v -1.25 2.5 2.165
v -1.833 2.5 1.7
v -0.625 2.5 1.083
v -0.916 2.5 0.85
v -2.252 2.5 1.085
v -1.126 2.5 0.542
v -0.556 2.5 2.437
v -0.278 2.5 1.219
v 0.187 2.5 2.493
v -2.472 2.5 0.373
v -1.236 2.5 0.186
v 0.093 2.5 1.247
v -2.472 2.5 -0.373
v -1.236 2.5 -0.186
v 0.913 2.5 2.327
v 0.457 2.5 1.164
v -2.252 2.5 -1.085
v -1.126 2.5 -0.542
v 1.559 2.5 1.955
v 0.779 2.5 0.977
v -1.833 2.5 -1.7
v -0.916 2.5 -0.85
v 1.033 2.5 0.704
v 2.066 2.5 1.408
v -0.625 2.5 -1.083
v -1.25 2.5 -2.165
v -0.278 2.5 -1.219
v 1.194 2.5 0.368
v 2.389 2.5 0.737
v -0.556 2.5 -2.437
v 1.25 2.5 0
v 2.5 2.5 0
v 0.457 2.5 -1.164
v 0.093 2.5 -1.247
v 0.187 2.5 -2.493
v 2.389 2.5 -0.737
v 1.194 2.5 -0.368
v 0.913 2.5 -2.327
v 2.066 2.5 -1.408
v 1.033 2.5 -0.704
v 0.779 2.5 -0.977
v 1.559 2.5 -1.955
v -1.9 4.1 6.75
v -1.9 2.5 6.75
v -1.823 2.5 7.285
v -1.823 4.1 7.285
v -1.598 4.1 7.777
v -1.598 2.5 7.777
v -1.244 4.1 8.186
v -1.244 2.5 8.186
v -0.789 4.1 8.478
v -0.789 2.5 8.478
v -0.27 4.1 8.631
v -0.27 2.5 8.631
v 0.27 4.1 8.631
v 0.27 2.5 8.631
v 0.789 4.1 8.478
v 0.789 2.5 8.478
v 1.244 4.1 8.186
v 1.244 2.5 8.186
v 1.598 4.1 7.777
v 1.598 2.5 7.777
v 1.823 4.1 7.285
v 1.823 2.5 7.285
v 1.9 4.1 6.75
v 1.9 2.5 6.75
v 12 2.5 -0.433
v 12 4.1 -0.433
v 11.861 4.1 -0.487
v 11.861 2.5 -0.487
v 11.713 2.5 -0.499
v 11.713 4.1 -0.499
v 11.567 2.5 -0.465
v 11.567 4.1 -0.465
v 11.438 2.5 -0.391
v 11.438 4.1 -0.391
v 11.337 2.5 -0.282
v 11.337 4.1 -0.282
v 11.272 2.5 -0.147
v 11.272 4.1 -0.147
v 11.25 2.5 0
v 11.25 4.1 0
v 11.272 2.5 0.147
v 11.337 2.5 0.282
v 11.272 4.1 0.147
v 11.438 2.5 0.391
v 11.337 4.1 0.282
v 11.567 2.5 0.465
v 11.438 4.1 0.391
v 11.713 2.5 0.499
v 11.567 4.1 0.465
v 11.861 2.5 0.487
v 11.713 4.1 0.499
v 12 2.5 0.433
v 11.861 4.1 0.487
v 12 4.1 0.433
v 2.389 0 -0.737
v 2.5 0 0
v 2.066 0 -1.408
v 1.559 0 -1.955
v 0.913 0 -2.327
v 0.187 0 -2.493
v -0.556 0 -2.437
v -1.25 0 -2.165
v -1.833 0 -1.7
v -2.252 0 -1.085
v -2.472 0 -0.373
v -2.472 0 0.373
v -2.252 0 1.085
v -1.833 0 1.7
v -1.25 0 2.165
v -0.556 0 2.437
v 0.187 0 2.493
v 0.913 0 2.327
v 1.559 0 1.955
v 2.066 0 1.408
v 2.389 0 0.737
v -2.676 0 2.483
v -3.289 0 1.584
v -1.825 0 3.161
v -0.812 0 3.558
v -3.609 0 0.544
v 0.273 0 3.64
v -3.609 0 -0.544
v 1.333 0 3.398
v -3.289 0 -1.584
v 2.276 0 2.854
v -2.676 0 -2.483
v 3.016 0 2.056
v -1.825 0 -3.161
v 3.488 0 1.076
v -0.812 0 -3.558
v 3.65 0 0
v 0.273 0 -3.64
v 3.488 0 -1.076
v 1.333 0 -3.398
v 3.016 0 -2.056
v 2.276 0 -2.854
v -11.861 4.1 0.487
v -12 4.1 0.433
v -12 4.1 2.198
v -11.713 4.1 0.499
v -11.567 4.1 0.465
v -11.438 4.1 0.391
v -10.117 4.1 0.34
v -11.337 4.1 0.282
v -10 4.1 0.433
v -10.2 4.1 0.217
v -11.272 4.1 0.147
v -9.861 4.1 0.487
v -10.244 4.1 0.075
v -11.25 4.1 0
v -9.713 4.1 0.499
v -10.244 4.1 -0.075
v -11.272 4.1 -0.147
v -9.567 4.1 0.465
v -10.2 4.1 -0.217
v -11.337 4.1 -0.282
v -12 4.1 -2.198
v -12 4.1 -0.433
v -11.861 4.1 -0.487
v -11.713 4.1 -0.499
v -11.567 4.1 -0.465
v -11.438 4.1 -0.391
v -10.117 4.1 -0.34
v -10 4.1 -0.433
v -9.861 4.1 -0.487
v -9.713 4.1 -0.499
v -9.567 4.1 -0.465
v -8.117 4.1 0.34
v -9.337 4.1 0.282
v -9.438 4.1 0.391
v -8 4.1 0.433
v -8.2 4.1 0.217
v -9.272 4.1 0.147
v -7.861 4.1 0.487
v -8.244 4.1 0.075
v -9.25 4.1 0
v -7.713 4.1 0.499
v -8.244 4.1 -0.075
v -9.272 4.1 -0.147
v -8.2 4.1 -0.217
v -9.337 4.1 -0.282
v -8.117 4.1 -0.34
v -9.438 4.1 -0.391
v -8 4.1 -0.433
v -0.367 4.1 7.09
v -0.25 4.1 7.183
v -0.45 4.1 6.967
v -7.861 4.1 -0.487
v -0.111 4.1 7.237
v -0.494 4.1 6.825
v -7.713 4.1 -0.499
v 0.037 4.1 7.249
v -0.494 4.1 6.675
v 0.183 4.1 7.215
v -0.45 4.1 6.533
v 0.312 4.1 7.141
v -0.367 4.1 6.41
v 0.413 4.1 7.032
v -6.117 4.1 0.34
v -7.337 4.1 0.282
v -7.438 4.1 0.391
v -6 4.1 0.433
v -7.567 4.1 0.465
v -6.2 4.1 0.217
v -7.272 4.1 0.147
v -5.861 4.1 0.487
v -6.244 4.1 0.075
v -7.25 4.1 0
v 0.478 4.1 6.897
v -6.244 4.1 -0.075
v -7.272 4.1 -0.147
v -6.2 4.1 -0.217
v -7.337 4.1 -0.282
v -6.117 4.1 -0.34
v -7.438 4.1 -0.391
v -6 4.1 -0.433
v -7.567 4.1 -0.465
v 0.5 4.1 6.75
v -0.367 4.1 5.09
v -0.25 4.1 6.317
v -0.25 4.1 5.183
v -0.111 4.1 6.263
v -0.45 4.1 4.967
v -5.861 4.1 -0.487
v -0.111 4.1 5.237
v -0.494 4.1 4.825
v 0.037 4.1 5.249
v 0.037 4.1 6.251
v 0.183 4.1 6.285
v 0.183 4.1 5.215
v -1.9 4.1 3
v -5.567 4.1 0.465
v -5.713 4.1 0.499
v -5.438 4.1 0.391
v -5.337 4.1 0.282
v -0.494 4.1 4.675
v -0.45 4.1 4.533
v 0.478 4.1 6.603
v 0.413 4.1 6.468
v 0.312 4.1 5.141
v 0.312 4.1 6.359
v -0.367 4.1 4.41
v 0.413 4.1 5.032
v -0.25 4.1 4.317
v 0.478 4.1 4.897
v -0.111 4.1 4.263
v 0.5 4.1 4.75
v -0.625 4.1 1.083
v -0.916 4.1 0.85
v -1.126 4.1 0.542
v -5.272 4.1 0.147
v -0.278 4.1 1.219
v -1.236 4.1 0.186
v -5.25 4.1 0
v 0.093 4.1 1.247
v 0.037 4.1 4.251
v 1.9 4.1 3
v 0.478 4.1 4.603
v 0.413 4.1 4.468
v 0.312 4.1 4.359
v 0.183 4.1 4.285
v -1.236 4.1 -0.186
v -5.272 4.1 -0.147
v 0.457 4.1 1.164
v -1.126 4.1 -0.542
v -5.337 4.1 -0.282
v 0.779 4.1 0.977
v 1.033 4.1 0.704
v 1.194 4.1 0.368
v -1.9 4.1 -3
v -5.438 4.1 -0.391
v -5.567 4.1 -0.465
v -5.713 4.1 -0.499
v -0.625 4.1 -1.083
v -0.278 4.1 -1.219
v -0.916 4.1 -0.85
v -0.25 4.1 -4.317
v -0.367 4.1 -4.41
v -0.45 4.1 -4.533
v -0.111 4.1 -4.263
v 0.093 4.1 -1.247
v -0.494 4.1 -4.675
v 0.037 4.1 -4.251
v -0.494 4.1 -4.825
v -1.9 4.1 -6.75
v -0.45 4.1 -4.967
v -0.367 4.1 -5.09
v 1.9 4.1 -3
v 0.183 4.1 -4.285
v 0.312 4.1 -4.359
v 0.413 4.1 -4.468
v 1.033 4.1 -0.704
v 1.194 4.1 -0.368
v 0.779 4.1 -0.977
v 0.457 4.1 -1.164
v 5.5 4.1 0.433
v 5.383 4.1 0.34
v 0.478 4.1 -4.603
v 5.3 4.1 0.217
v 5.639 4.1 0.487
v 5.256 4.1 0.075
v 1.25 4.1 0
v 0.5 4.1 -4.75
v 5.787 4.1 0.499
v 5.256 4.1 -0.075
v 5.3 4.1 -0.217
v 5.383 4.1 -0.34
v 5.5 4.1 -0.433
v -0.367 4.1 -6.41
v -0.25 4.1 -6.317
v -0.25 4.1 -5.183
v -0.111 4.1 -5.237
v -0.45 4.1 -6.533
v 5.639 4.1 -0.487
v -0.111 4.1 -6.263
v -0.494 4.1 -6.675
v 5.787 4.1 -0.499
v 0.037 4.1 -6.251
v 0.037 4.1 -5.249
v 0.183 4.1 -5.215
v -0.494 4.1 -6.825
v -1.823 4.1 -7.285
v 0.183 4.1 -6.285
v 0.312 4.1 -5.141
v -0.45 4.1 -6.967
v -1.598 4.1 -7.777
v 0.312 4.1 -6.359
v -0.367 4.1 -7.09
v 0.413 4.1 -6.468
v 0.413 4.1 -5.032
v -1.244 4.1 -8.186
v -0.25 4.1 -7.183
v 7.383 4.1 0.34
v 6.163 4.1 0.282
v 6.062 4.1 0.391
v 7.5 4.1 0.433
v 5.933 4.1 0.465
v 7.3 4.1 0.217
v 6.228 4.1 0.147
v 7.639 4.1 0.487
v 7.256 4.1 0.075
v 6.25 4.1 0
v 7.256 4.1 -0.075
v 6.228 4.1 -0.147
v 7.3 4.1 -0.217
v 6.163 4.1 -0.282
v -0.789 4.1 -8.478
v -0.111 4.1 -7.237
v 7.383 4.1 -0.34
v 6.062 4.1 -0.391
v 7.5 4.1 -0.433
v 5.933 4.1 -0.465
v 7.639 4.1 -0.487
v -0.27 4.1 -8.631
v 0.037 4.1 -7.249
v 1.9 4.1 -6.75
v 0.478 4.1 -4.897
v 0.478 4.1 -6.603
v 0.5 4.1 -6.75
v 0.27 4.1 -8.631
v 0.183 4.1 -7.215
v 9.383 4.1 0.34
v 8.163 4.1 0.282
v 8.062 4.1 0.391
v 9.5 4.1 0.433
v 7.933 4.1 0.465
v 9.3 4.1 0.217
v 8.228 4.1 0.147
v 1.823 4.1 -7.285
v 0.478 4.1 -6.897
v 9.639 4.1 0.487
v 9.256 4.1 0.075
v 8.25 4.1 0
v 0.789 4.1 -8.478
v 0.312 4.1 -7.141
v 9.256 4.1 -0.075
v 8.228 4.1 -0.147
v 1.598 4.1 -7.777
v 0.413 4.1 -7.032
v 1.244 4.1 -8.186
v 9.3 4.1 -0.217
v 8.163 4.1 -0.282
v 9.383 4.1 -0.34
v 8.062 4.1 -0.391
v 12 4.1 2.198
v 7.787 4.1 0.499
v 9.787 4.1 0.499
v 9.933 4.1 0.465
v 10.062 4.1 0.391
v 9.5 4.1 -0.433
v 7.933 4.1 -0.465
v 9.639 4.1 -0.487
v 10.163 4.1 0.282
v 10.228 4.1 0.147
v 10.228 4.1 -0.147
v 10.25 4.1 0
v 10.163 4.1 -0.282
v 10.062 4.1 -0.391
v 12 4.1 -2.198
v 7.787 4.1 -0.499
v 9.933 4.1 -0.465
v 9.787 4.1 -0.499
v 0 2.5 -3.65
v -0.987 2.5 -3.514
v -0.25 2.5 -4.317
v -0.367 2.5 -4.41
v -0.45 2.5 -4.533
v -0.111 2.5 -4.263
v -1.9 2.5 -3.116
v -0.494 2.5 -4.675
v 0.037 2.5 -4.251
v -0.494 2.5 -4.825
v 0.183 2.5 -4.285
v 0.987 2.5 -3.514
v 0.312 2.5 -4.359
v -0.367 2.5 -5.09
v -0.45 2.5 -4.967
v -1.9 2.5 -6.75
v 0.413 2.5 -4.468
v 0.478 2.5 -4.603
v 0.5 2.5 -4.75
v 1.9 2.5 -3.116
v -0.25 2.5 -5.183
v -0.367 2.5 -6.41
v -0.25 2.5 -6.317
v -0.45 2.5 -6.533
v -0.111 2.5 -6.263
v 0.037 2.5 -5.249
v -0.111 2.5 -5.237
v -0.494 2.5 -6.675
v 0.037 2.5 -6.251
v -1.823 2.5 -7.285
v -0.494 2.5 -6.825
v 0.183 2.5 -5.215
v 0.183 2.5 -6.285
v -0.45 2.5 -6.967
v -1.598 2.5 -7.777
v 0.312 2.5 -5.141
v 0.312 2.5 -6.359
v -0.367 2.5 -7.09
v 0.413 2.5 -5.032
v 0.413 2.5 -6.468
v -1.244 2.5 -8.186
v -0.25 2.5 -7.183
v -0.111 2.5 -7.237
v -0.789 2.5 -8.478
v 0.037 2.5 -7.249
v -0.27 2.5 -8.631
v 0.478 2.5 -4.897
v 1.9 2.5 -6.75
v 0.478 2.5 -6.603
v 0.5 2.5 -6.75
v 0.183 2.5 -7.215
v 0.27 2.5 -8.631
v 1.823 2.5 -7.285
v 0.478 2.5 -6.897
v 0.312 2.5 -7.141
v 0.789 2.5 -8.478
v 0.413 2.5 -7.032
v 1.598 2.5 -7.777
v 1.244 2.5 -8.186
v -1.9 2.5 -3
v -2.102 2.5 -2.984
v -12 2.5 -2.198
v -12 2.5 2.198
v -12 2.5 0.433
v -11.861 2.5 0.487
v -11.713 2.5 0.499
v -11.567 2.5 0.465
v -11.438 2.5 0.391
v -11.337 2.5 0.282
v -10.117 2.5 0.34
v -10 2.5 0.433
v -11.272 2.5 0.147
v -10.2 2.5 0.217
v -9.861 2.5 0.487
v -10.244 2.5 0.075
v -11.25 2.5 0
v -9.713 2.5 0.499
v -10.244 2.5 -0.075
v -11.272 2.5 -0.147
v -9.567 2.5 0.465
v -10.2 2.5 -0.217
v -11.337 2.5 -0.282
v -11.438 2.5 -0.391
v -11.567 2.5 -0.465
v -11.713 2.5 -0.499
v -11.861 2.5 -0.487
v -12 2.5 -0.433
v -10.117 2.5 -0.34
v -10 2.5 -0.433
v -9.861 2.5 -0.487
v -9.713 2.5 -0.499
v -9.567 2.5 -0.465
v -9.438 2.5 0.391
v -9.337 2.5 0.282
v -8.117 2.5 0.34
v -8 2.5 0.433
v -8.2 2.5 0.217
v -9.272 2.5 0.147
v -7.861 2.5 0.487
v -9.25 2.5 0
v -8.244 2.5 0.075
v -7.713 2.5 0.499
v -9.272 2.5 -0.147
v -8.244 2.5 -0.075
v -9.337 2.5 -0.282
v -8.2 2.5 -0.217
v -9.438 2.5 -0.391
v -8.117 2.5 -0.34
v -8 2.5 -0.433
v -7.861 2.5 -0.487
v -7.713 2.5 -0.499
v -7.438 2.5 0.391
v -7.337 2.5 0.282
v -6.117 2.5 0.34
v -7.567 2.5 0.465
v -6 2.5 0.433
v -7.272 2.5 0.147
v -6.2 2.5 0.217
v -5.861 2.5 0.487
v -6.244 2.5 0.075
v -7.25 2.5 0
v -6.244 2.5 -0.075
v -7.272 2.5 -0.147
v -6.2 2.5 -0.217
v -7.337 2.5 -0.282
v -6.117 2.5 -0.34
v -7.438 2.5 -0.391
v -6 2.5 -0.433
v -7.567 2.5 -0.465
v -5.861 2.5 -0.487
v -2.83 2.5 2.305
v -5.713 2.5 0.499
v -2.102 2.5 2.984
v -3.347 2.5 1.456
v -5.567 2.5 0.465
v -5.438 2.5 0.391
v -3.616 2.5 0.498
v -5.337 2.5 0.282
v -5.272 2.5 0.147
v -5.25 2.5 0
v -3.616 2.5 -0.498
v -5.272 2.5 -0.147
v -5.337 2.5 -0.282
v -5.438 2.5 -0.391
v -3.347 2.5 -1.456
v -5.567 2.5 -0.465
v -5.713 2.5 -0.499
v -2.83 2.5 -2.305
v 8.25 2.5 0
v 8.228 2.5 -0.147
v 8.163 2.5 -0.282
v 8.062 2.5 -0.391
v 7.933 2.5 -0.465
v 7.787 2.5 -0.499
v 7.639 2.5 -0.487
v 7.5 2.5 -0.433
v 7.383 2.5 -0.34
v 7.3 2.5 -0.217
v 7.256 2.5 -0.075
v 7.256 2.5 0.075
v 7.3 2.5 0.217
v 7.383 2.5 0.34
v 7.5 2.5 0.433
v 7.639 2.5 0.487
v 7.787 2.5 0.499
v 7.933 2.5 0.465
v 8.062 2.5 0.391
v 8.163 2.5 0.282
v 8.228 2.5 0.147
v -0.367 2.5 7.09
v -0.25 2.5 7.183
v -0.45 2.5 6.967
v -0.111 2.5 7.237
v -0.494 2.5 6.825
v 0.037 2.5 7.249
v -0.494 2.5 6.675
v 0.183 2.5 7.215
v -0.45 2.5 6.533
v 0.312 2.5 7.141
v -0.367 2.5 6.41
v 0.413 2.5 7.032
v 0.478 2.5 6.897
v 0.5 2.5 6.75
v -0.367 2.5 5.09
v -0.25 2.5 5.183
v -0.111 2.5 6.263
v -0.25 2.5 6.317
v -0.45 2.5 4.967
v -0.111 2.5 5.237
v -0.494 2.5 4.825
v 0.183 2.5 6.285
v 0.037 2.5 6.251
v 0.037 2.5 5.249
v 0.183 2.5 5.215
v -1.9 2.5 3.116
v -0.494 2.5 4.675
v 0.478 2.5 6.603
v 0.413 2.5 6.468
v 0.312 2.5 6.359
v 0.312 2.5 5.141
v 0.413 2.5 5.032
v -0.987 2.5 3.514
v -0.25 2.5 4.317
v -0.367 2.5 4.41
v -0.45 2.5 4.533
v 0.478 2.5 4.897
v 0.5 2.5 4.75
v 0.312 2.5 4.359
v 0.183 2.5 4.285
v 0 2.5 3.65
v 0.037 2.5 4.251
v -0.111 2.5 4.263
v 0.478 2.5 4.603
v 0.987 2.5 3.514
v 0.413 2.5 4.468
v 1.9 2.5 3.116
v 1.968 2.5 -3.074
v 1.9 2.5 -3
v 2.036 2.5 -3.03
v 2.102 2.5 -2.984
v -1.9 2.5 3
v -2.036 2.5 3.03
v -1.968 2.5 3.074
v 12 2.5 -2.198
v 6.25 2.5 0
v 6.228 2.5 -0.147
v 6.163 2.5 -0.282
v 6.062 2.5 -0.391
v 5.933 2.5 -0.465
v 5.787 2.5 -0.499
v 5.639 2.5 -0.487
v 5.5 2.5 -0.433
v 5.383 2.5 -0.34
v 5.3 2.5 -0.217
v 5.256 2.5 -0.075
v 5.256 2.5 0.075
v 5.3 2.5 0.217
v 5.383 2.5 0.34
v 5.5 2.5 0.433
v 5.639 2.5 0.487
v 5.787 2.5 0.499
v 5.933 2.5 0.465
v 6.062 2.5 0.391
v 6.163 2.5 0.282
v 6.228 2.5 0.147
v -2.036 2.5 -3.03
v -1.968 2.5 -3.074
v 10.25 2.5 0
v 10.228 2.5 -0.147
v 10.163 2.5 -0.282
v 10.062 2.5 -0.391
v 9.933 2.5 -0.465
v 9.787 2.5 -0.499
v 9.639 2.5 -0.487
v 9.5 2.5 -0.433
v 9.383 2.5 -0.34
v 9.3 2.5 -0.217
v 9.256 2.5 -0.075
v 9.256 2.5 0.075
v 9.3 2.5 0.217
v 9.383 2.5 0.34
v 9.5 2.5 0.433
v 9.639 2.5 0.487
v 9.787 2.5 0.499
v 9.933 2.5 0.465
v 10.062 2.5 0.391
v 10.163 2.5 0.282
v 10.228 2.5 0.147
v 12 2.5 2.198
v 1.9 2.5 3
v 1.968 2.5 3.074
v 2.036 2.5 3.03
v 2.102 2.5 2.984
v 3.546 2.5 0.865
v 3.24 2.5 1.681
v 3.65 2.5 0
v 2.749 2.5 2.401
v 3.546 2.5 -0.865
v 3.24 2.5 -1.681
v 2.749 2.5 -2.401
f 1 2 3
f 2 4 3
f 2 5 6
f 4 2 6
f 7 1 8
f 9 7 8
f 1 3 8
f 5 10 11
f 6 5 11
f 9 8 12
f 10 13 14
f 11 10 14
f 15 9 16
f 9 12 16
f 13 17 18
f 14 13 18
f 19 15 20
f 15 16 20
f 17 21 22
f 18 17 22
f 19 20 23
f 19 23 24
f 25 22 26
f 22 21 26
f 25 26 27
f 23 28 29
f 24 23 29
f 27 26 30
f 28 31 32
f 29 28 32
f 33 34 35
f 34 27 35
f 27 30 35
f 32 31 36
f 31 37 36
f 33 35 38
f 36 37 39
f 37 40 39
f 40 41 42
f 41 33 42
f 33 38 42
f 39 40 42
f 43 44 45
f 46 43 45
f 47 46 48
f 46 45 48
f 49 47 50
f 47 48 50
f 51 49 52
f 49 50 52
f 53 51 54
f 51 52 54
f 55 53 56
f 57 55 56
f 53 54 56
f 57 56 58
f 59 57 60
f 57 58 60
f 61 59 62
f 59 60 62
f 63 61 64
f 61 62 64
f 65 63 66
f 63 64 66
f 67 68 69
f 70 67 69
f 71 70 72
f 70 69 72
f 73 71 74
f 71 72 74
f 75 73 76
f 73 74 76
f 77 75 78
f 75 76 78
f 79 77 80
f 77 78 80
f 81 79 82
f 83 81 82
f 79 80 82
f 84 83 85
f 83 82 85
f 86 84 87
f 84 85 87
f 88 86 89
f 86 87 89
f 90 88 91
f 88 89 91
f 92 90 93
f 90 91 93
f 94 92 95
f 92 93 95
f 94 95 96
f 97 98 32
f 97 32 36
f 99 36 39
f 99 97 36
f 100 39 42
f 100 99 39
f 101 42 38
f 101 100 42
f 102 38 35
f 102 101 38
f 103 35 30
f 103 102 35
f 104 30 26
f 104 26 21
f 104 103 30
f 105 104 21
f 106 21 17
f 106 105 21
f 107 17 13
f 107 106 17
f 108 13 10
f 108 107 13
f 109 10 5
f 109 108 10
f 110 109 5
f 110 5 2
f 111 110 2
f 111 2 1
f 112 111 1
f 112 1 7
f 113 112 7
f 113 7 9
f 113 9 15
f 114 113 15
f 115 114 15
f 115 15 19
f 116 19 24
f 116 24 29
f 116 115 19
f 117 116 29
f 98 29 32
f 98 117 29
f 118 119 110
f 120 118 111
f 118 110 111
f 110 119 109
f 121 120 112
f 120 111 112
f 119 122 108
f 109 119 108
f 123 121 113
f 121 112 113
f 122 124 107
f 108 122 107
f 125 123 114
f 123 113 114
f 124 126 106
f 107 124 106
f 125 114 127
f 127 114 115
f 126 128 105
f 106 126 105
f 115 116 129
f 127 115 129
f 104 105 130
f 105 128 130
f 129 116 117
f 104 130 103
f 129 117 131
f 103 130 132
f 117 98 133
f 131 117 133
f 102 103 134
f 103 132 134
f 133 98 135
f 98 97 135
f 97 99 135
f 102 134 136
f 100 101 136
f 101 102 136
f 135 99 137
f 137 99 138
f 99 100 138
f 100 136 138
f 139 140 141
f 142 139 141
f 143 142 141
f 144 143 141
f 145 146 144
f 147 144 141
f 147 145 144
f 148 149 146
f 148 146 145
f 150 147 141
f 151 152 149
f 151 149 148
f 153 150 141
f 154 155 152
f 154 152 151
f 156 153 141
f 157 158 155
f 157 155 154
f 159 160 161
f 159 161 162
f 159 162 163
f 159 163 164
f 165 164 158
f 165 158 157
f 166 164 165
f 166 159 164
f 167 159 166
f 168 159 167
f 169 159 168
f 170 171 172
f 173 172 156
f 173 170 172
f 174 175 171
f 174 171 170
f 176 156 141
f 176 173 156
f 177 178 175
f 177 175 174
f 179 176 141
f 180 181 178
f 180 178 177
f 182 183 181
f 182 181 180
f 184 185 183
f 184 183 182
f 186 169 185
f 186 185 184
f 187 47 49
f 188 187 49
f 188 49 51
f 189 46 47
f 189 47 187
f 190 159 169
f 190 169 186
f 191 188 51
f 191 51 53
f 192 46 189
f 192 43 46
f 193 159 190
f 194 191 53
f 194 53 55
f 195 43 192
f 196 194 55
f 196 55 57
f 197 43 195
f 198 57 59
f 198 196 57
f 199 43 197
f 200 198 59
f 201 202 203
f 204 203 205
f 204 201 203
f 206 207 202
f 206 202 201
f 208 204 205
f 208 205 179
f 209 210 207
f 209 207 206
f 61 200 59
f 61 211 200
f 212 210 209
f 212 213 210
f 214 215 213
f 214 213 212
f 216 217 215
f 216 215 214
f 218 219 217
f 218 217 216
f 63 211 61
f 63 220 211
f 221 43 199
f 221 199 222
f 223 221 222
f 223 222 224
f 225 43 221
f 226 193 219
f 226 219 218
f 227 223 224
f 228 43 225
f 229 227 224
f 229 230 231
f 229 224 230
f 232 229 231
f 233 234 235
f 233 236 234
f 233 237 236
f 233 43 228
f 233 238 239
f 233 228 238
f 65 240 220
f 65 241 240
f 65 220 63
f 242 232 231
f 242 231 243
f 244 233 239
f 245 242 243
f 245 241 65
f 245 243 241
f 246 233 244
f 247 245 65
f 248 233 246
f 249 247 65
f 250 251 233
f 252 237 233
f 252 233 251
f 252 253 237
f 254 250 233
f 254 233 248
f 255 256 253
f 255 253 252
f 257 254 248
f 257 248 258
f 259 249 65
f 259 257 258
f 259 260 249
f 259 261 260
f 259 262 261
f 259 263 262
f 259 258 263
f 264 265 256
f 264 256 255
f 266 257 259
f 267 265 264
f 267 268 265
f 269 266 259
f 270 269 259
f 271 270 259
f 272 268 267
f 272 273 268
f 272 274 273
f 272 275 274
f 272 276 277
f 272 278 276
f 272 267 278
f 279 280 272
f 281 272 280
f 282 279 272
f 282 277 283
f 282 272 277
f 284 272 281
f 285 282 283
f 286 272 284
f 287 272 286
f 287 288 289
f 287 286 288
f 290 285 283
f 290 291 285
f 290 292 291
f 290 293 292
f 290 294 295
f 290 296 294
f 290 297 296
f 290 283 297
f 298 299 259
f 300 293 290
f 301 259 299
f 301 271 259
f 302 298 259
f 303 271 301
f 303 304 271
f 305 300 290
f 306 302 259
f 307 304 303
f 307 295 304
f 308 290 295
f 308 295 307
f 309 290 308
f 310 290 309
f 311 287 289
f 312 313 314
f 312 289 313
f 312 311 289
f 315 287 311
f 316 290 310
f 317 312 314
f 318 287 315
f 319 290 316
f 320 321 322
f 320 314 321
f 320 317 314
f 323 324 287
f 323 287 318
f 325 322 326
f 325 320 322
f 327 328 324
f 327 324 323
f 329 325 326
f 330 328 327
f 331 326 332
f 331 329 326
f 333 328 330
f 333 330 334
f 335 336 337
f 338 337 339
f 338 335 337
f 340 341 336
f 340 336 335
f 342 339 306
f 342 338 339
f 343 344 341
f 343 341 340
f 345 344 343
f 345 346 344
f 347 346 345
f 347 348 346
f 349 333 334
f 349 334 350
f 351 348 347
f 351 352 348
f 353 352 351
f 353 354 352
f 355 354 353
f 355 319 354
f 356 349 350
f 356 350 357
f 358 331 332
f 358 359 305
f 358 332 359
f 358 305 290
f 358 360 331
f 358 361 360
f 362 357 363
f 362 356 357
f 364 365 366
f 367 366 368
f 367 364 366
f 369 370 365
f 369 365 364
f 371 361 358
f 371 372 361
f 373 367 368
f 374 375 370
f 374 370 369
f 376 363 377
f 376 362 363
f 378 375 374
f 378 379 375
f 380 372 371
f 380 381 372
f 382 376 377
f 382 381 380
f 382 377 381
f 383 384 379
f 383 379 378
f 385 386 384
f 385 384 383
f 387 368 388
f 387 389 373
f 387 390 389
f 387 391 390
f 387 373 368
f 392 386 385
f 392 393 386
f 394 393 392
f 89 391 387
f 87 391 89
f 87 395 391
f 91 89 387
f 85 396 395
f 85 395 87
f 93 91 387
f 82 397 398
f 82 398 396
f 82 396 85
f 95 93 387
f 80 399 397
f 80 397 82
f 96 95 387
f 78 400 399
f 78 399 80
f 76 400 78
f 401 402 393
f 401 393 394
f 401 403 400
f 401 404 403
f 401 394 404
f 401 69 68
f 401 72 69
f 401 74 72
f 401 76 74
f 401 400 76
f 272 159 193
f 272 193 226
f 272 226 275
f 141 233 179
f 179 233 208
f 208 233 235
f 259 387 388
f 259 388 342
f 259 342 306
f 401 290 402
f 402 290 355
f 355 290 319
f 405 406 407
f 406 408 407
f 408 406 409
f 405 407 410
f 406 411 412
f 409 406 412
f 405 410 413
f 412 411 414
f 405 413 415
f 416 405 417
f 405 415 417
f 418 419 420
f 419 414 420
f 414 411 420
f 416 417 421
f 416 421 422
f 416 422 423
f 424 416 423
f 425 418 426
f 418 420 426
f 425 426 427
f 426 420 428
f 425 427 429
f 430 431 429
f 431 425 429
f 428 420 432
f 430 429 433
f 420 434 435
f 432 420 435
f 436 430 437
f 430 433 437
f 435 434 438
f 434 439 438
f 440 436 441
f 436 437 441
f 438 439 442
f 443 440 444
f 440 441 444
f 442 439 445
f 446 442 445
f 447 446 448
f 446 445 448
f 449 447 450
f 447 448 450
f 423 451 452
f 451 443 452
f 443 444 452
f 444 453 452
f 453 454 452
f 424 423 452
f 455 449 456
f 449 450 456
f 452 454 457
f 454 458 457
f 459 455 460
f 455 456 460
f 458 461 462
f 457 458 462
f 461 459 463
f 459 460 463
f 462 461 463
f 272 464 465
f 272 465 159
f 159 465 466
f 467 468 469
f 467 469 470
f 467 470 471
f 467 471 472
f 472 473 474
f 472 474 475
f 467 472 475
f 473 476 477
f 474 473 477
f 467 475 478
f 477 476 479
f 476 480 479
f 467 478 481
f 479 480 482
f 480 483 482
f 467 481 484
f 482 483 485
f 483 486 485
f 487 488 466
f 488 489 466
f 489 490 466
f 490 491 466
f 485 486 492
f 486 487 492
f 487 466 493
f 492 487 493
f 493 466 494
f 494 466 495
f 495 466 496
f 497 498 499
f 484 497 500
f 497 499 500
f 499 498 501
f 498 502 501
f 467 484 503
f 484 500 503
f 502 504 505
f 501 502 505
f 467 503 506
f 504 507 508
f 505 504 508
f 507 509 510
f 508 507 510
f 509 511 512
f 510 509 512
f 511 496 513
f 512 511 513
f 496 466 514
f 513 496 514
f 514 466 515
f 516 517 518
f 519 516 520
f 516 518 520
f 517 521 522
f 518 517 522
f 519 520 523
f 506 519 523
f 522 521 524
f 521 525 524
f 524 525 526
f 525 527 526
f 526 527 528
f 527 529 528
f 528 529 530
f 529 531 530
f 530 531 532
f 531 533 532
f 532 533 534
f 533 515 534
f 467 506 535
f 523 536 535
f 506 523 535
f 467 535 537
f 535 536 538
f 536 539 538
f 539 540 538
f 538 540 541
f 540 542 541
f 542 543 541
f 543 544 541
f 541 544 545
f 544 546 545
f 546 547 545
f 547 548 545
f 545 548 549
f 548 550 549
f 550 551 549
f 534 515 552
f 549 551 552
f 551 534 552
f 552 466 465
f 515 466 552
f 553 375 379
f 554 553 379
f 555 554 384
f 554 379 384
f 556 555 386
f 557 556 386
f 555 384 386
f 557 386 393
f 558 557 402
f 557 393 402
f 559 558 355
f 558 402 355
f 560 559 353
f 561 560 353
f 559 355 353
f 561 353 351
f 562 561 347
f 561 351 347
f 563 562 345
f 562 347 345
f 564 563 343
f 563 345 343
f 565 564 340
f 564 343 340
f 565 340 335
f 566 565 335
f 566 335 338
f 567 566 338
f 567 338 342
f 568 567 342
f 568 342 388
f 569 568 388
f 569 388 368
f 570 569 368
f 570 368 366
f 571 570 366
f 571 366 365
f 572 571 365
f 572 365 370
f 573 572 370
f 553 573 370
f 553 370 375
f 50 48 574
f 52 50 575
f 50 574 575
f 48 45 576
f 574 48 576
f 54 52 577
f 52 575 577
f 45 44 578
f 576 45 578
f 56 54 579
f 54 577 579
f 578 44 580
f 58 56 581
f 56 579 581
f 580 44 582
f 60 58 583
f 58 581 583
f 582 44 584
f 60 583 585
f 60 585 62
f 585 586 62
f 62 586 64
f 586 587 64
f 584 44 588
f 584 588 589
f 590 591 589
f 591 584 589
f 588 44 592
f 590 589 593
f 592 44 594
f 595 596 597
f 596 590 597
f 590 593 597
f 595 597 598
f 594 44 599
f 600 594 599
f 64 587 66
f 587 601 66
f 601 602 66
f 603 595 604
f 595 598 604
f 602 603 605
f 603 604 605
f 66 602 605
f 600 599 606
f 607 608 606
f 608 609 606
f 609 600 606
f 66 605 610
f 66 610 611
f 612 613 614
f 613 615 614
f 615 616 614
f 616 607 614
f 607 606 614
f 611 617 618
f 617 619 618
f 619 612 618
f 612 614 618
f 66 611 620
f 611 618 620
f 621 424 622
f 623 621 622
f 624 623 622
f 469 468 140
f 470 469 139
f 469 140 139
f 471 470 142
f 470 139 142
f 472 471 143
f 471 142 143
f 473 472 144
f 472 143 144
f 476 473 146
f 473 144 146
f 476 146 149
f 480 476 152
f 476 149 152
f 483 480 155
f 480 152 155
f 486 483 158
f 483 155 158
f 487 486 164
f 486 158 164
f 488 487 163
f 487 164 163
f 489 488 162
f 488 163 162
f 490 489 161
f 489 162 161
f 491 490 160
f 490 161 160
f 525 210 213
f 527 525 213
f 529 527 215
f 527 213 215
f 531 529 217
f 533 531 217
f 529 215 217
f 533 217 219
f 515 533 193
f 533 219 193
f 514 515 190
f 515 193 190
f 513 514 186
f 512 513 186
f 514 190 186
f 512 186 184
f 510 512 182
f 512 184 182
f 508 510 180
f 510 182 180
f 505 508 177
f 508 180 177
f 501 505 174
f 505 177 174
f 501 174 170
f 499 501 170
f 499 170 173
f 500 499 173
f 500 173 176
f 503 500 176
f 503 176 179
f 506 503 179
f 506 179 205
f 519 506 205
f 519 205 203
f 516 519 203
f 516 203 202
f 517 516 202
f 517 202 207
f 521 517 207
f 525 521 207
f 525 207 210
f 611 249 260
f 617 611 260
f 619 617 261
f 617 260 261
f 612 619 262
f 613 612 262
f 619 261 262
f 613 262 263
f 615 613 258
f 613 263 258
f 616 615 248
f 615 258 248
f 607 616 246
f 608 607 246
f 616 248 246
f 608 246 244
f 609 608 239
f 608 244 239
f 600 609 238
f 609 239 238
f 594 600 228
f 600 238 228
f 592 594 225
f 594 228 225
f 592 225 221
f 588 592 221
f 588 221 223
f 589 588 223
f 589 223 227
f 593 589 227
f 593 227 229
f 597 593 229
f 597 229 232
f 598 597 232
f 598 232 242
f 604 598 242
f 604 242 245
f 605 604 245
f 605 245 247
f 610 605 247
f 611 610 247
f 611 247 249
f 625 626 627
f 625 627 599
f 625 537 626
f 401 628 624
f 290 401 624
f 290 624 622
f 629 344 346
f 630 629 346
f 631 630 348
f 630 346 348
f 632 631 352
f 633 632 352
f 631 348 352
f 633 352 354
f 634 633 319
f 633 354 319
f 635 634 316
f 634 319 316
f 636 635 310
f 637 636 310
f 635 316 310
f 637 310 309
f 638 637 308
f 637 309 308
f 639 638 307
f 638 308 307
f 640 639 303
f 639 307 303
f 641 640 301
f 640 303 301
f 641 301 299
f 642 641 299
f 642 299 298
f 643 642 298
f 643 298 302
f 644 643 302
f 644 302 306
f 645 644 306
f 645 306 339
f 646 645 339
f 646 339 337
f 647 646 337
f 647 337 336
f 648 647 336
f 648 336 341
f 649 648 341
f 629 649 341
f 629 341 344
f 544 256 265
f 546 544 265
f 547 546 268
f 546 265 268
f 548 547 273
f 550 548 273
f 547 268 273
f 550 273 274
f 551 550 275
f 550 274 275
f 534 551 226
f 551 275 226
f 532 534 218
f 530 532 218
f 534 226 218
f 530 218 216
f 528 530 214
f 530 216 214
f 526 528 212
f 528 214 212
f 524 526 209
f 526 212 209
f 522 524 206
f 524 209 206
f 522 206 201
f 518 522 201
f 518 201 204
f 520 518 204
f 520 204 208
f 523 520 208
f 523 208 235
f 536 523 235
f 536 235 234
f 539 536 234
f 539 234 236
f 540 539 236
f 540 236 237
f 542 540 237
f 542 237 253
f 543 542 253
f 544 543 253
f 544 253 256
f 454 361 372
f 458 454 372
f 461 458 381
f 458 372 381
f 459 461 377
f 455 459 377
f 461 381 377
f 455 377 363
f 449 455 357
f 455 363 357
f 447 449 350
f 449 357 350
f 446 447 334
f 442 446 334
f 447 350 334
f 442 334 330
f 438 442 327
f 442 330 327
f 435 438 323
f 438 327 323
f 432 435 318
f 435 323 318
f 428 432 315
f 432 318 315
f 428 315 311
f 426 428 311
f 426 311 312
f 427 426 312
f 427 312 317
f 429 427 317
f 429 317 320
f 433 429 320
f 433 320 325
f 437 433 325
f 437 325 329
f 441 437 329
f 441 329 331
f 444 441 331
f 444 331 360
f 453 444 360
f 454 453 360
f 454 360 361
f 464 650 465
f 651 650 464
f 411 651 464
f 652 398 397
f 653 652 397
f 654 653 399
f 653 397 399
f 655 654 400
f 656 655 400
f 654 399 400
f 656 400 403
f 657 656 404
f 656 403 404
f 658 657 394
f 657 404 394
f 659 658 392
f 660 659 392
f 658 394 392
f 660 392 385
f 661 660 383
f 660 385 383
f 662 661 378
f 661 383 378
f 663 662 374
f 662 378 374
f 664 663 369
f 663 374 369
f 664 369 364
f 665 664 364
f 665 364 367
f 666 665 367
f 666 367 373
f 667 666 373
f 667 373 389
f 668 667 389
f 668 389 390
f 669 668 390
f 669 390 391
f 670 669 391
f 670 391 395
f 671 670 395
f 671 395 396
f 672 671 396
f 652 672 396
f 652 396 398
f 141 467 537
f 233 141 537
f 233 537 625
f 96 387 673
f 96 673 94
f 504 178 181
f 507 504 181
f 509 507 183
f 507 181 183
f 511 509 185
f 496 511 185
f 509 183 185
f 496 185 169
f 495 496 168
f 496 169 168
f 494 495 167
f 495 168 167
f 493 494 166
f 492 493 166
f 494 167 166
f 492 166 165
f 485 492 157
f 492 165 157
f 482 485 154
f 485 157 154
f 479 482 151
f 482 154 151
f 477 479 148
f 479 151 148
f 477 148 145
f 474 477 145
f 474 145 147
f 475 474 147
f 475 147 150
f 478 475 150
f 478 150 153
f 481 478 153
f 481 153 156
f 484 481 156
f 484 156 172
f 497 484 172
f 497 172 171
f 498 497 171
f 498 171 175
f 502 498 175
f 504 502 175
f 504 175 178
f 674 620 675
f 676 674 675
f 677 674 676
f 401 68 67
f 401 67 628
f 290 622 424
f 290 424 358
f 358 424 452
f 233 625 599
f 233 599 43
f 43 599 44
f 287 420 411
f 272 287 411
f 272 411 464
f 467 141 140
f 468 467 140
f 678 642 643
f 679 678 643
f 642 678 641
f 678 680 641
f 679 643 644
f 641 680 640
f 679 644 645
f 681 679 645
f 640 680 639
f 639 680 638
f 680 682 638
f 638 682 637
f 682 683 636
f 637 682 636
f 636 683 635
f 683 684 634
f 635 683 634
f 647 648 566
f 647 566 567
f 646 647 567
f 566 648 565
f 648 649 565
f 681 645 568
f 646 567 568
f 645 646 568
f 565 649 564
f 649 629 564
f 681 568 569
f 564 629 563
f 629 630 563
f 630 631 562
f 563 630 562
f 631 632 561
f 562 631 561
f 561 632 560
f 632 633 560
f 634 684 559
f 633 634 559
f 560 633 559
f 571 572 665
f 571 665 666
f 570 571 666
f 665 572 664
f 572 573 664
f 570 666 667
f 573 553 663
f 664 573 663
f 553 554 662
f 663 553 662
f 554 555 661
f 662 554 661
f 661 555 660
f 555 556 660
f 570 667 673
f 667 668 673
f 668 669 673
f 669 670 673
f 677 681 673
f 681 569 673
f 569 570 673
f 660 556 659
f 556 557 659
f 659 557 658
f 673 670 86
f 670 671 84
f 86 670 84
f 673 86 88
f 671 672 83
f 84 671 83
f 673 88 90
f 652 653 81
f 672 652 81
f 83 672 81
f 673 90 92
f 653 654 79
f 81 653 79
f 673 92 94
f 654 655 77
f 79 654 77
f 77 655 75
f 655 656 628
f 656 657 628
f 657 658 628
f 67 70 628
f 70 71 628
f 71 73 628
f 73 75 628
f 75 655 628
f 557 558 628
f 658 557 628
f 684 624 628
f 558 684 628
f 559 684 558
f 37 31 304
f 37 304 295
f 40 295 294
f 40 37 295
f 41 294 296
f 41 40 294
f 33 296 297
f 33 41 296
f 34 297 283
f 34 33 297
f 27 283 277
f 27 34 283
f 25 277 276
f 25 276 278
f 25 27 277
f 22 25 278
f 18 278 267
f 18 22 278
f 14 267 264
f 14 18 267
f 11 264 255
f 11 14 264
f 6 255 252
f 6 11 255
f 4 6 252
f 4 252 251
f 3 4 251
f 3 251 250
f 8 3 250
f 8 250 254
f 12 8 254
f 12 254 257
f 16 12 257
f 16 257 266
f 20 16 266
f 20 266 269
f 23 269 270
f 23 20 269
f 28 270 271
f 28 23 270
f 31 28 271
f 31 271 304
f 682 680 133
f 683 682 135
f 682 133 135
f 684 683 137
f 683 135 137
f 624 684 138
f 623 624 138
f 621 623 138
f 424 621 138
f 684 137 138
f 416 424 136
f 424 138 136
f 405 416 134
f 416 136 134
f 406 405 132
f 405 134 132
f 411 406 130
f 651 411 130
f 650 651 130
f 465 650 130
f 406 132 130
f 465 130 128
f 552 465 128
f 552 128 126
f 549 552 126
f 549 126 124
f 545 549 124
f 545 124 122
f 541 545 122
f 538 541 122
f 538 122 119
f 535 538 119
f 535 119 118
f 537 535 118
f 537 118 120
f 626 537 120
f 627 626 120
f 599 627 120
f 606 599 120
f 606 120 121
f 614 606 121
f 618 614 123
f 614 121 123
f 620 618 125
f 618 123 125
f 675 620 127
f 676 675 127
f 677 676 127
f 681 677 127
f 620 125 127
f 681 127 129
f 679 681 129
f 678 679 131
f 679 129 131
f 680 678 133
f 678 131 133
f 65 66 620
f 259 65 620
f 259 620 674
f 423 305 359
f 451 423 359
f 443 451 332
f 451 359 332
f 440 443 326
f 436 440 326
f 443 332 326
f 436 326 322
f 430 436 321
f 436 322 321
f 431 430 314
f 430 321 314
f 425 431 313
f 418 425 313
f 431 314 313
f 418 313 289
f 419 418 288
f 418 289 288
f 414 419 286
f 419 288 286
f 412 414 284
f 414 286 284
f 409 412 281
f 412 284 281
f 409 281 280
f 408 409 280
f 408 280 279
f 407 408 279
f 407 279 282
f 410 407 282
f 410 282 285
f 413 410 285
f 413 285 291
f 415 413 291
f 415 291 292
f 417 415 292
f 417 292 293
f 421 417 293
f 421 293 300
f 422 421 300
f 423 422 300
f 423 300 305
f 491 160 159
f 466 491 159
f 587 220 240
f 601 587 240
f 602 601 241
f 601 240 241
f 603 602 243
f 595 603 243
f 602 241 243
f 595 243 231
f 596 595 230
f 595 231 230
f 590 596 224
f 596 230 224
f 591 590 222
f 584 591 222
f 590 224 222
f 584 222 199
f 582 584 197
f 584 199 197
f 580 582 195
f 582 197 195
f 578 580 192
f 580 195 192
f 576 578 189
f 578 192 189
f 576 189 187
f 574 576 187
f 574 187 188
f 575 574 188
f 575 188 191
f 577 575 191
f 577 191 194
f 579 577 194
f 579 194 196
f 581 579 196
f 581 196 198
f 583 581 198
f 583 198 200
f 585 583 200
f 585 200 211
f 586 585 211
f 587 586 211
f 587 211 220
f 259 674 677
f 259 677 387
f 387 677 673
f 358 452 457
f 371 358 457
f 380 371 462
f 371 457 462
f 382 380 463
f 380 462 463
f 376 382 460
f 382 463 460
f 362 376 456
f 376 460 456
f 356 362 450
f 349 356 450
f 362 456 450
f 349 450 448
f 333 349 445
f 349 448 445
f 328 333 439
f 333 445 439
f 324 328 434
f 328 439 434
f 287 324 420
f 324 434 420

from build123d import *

# Parameters (mm, degrees)
SKETCH1_R           = 3.65
SKETCH1_R_2         = 2.5
BOSS_EXTRUDE1_DEPTH = 2.5
SKETCH2_R           = 1.25
BOSS_EXTRUDE2_DEPTH = 1.6
CUT_EXTRUDE1_REACH  = 6.1
SKETCH3_R           = 0.5
SKETCH4_W           = 8.285333373
SKETCH4_H           = 11.992925475
CUT_EXTRUDE2_DEPTH  = 5.1


with BuildPart() as part:
    # Sketch1 → Boss-Extrude1 (new body)
    with BuildSketch(Plane(origin=(0, 0, 0), x_dir=(1, 0, 0), z_dir=(0, 1, 0))):
        Circle(SKETCH1_R)
        Circle(SKETCH1_R_2, mode=Mode.SUBTRACT)
    extrude(amount=BOSS_EXTRUDE1_DEPTH)

    # Sketch2 → Boss-Extrude2 (add)
    with BuildSketch(Plane(origin=(0, 2.5, 0), x_dir=(1, 0, 0), z_dir=(0, 1, 0))):
        with BuildLine():
            Line((-1.9, 6.75), (-1.9, 3))
            Line((-1.9, 3), (-15.75, 1.9))
            ThreePointArc((-15.75, 1.9), (-17.65, 0), (-15.75, -1.9))
            Line((-15.75, -1.9), (-1.9, -3))
            Line((-1.9, -3), (-1.9, -6.75))
            ThreePointArc((-1.9, -6.75), (0, -8.65), (1.9, -6.75))
            Line((1.9, -6.75), (1.9, -3))
            Line((1.9, -3), (15.75, -1.9))
            ThreePointArc((15.75, -1.9), (17.65, 0), (15.75, 1.9))
            Line((15.75, 1.9), (1.9, 3))
            Line((1.9, 3), (1.9, 6.75))
            ThreePointArc((1.9, 6.75), (0, 8.65), (-1.9, 6.75))
        make_face()
        Circle(SKETCH2_R, mode=Mode.SUBTRACT)
    extrude(amount=BOSS_EXTRUDE2_DEPTH)

    # Sketch3 → Cut-Extrude1 (cut, up to next)
    with BuildSketch(Plane(origin=(0, 4.1, 0), x_dir=(1, 0, 0), z_dir=(0, 1, 0)), mode=Mode.PRIVATE) as cut_extrude1_sk1:
        with Locations((0, 6.75)):
            Circle(SKETCH3_R)
    cut_extrude1_tool1 = extrude(cut_extrude1_sk1.sketch, amount=-CUT_EXTRUDE1_REACH, mode=Mode.PRIVATE) & part.part
    add(cut_extrude1_tool1.solids().sort_by_distance((0, 4.1, -6.75))[0], mode=Mode.SUBTRACT)
    # Sketch3 → Cut-Extrude1 (cut, up to next)
    with BuildSketch(Plane(origin=(0, 4.1, 0), x_dir=(1, 0, 0), z_dir=(0, 1, 0)), mode=Mode.PRIVATE) as cut_extrude1_sk2:
        with Locations((0, 4.75)):
            Circle(SKETCH3_R)
    cut_extrude1_tool2 = extrude(cut_extrude1_sk2.sketch, amount=-CUT_EXTRUDE1_REACH, mode=Mode.PRIVATE) & part.part
    add(cut_extrude1_tool2.solids().sort_by_distance((0, 4.1, -4.75))[0], mode=Mode.SUBTRACT)
    # Sketch3 → Cut-Extrude1 (cut, up to next)
    with BuildSketch(Plane(origin=(0, 4.1, 0), x_dir=(1, 0, 0), z_dir=(0, 1, 0)), mode=Mode.PRIVATE) as cut_extrude1_sk3:
        with Locations((-15.75, 0)):
            Circle(SKETCH3_R)
    cut_extrude1_tool3 = extrude(cut_extrude1_sk3.sketch, amount=-CUT_EXTRUDE1_REACH, mode=Mode.PRIVATE) & part.part
    add(cut_extrude1_tool3.solids().sort_by_distance((-15.75, 4.1, 0))[0], mode=Mode.SUBTRACT)
    # Sketch3 → Cut-Extrude1 (cut, up to next)
    with BuildSketch(Plane(origin=(0, 4.1, 0), x_dir=(1, 0, 0), z_dir=(0, 1, 0)), mode=Mode.PRIVATE) as cut_extrude1_sk4:
        with Locations((-13.75, 0)):
            Circle(SKETCH3_R)
    cut_extrude1_tool4 = extrude(cut_extrude1_sk4.sketch, amount=-CUT_EXTRUDE1_REACH, mode=Mode.PRIVATE) & part.part
    add(cut_extrude1_tool4.solids().sort_by_distance((-13.75, 4.1, 0))[0], mode=Mode.SUBTRACT)
    # Sketch3 → Cut-Extrude1 (cut, up to next)
    with BuildSketch(Plane(origin=(0, 4.1, 0), x_dir=(1, 0, 0), z_dir=(0, 1, 0)), mode=Mode.PRIVATE) as cut_extrude1_sk5:
        with Locations((-11.75, 0)):
            Circle(SKETCH3_R)
    cut_extrude1_tool5 = extrude(cut_extrude1_sk5.sketch, amount=-CUT_EXTRUDE1_REACH, mode=Mode.PRIVATE) & part.part
    add(cut_extrude1_tool5.solids().sort_by_distance((-11.75, 4.1, 0))[0], mode=Mode.SUBTRACT)
    # Sketch3 → Cut-Extrude1 (cut, up to next)
    with BuildSketch(Plane(origin=(0, 4.1, 0), x_dir=(1, 0, 0), z_dir=(0, 1, 0)), mode=Mode.PRIVATE) as cut_extrude1_sk6:
        with Locations((-9.75, 0)):
            Circle(SKETCH3_R)
    cut_extrude1_tool6 = extrude(cut_extrude1_sk6.sketch, amount=-CUT_EXTRUDE1_REACH, mode=Mode.PRIVATE) & part.part
    add(cut_extrude1_tool6.solids().sort_by_distance((-9.75, 4.1, 0))[0], mode=Mode.SUBTRACT)
    # Sketch3 → Cut-Extrude1 (cut, up to next)
    with BuildSketch(Plane(origin=(0, 4.1, 0), x_dir=(1, 0, 0), z_dir=(0, 1, 0)), mode=Mode.PRIVATE) as cut_extrude1_sk7:
        with Locations((-7.75, 0)):
            Circle(SKETCH3_R)
    cut_extrude1_tool7 = extrude(cut_extrude1_sk7.sketch, amount=-CUT_EXTRUDE1_REACH, mode=Mode.PRIVATE) & part.part
    add(cut_extrude1_tool7.solids().sort_by_distance((-7.75, 4.1, 0))[0], mode=Mode.SUBTRACT)
    # Sketch3 → Cut-Extrude1 (cut, up to next)
    with BuildSketch(Plane(origin=(0, 4.1, 0), x_dir=(1, 0, 0), z_dir=(0, 1, 0)), mode=Mode.PRIVATE) as cut_extrude1_sk8:
        with Locations((-5.75, 0)):
            Circle(SKETCH3_R)
    cut_extrude1_tool8 = extrude(cut_extrude1_sk8.sketch, amount=-CUT_EXTRUDE1_REACH, mode=Mode.PRIVATE) & part.part
    add(cut_extrude1_tool8.solids().sort_by_distance((-5.75, 4.1, 0))[0], mode=Mode.SUBTRACT)
    # Sketch3 → Cut-Extrude1 (cut, up to next)
    with BuildSketch(Plane(origin=(0, 4.1, 0), x_dir=(1, 0, 0), z_dir=(0, 1, 0)), mode=Mode.PRIVATE) as cut_extrude1_sk9:
        with Locations((5.75, 0)):
            Circle(SKETCH3_R)
    cut_extrude1_tool9 = extrude(cut_extrude1_sk9.sketch, amount=-CUT_EXTRUDE1_REACH, mode=Mode.PRIVATE) & part.part
    add(cut_extrude1_tool9.solids().sort_by_distance((5.75, 4.1, 0))[0], mode=Mode.SUBTRACT)
    # Sketch3 → Cut-Extrude1 (cut, up to next)
    with BuildSketch(Plane(origin=(0, 4.1, 0), x_dir=(1, 0, 0), z_dir=(0, 1, 0)), mode=Mode.PRIVATE) as cut_extrude1_sk10:
        with Locations((7.75, 0)):
            Circle(SKETCH3_R)
    cut_extrude1_tool10 = extrude(cut_extrude1_sk10.sketch, amount=-CUT_EXTRUDE1_REACH, mode=Mode.PRIVATE) & part.part
    add(cut_extrude1_tool10.solids().sort_by_distance((7.75, 4.1, 0))[0], mode=Mode.SUBTRACT)
    # Sketch3 → Cut-Extrude1 (cut, up to next)
    with BuildSketch(Plane(origin=(0, 4.1, 0), x_dir=(1, 0, 0), z_dir=(0, 1, 0)), mode=Mode.PRIVATE) as cut_extrude1_sk11:
        with Locations((9.75, 0)):
            Circle(SKETCH3_R)
    cut_extrude1_tool11 = extrude(cut_extrude1_sk11.sketch, amount=-CUT_EXTRUDE1_REACH, mode=Mode.PRIVATE) & part.part
    add(cut_extrude1_tool11.solids().sort_by_distance((9.75, 4.1, 0))[0], mode=Mode.SUBTRACT)
    # Sketch3 → Cut-Extrude1 (cut, up to next)
    with BuildSketch(Plane(origin=(0, 4.1, 0), x_dir=(1, 0, 0), z_dir=(0, 1, 0)), mode=Mode.PRIVATE) as cut_extrude1_sk12:
        with Locations((11.75, 0)):
            Circle(SKETCH3_R)
    cut_extrude1_tool12 = extrude(cut_extrude1_sk12.sketch, amount=-CUT_EXTRUDE1_REACH, mode=Mode.PRIVATE) & part.part
    add(cut_extrude1_tool12.solids().sort_by_distance((11.75, 4.1, 0))[0], mode=Mode.SUBTRACT)
    # Sketch3 → Cut-Extrude1 (cut, up to next)
    with BuildSketch(Plane(origin=(0, 4.1, 0), x_dir=(1, 0, 0), z_dir=(0, 1, 0)), mode=Mode.PRIVATE) as cut_extrude1_sk13:
        with Locations((13.75, 0)):
            Circle(SKETCH3_R)
    cut_extrude1_tool13 = extrude(cut_extrude1_sk13.sketch, amount=-CUT_EXTRUDE1_REACH, mode=Mode.PRIVATE) & part.part
    add(cut_extrude1_tool13.solids().sort_by_distance((13.75, 4.1, 0))[0], mode=Mode.SUBTRACT)
    # Sketch3 → Cut-Extrude1 (cut, up to next)
    with BuildSketch(Plane(origin=(0, 4.1, 0), x_dir=(1, 0, 0), z_dir=(0, 1, 0)), mode=Mode.PRIVATE) as cut_extrude1_sk14:
        with Locations((15.75, 0)):
            Circle(SKETCH3_R)
    cut_extrude1_tool14 = extrude(cut_extrude1_sk14.sketch, amount=-CUT_EXTRUDE1_REACH, mode=Mode.PRIVATE) & part.part
    add(cut_extrude1_tool14.solids().sort_by_distance((15.75, 4.1, 0))[0], mode=Mode.SUBTRACT)
    # Sketch3 → Cut-Extrude1 (cut, up to next)
    with BuildSketch(Plane(origin=(0, 4.1, 0), x_dir=(1, 0, 0), z_dir=(0, 1, 0)), mode=Mode.PRIVATE) as cut_extrude1_sk15:
        with Locations((0, -4.75)):
            Circle(SKETCH3_R)
    cut_extrude1_tool15 = extrude(cut_extrude1_sk15.sketch, amount=-CUT_EXTRUDE1_REACH, mode=Mode.PRIVATE) & part.part
    add(cut_extrude1_tool15.solids().sort_by_distance((0, 4.1, 4.75))[0], mode=Mode.SUBTRACT)
    # Sketch3 → Cut-Extrude1 (cut, up to next)
    with BuildSketch(Plane(origin=(0, 4.1, 0), x_dir=(1, 0, 0), z_dir=(0, 1, 0)), mode=Mode.PRIVATE) as cut_extrude1_sk16:
        with Locations((0, -6.75)):
            Circle(SKETCH3_R)
    cut_extrude1_tool16 = extrude(cut_extrude1_sk16.sketch, amount=-CUT_EXTRUDE1_REACH, mode=Mode.PRIVATE) & part.part
    add(cut_extrude1_tool16.solids().sort_by_distance((0, 4.1, 6.75))[0], mode=Mode.SUBTRACT)

    # Sketch4 → Cut-Extrude2 (cut, through all)
    with BuildSketch(Plane(origin=(0, 4.1, 0), x_dir=(1, 0, 0), z_dir=(0, 1, 0))):
        with Locations((-16.142666687, 0.926898026)):
            Rectangle(SKETCH4_W, SKETCH4_H)
        with Locations((16.142666687, 0.926898026)):
            Rectangle(SKETCH4_W, SKETCH4_H)
    extrude(amount=-CUT_EXTRUDE2_DEPTH, mode=Mode.SUBTRACT)


solid = part.part
